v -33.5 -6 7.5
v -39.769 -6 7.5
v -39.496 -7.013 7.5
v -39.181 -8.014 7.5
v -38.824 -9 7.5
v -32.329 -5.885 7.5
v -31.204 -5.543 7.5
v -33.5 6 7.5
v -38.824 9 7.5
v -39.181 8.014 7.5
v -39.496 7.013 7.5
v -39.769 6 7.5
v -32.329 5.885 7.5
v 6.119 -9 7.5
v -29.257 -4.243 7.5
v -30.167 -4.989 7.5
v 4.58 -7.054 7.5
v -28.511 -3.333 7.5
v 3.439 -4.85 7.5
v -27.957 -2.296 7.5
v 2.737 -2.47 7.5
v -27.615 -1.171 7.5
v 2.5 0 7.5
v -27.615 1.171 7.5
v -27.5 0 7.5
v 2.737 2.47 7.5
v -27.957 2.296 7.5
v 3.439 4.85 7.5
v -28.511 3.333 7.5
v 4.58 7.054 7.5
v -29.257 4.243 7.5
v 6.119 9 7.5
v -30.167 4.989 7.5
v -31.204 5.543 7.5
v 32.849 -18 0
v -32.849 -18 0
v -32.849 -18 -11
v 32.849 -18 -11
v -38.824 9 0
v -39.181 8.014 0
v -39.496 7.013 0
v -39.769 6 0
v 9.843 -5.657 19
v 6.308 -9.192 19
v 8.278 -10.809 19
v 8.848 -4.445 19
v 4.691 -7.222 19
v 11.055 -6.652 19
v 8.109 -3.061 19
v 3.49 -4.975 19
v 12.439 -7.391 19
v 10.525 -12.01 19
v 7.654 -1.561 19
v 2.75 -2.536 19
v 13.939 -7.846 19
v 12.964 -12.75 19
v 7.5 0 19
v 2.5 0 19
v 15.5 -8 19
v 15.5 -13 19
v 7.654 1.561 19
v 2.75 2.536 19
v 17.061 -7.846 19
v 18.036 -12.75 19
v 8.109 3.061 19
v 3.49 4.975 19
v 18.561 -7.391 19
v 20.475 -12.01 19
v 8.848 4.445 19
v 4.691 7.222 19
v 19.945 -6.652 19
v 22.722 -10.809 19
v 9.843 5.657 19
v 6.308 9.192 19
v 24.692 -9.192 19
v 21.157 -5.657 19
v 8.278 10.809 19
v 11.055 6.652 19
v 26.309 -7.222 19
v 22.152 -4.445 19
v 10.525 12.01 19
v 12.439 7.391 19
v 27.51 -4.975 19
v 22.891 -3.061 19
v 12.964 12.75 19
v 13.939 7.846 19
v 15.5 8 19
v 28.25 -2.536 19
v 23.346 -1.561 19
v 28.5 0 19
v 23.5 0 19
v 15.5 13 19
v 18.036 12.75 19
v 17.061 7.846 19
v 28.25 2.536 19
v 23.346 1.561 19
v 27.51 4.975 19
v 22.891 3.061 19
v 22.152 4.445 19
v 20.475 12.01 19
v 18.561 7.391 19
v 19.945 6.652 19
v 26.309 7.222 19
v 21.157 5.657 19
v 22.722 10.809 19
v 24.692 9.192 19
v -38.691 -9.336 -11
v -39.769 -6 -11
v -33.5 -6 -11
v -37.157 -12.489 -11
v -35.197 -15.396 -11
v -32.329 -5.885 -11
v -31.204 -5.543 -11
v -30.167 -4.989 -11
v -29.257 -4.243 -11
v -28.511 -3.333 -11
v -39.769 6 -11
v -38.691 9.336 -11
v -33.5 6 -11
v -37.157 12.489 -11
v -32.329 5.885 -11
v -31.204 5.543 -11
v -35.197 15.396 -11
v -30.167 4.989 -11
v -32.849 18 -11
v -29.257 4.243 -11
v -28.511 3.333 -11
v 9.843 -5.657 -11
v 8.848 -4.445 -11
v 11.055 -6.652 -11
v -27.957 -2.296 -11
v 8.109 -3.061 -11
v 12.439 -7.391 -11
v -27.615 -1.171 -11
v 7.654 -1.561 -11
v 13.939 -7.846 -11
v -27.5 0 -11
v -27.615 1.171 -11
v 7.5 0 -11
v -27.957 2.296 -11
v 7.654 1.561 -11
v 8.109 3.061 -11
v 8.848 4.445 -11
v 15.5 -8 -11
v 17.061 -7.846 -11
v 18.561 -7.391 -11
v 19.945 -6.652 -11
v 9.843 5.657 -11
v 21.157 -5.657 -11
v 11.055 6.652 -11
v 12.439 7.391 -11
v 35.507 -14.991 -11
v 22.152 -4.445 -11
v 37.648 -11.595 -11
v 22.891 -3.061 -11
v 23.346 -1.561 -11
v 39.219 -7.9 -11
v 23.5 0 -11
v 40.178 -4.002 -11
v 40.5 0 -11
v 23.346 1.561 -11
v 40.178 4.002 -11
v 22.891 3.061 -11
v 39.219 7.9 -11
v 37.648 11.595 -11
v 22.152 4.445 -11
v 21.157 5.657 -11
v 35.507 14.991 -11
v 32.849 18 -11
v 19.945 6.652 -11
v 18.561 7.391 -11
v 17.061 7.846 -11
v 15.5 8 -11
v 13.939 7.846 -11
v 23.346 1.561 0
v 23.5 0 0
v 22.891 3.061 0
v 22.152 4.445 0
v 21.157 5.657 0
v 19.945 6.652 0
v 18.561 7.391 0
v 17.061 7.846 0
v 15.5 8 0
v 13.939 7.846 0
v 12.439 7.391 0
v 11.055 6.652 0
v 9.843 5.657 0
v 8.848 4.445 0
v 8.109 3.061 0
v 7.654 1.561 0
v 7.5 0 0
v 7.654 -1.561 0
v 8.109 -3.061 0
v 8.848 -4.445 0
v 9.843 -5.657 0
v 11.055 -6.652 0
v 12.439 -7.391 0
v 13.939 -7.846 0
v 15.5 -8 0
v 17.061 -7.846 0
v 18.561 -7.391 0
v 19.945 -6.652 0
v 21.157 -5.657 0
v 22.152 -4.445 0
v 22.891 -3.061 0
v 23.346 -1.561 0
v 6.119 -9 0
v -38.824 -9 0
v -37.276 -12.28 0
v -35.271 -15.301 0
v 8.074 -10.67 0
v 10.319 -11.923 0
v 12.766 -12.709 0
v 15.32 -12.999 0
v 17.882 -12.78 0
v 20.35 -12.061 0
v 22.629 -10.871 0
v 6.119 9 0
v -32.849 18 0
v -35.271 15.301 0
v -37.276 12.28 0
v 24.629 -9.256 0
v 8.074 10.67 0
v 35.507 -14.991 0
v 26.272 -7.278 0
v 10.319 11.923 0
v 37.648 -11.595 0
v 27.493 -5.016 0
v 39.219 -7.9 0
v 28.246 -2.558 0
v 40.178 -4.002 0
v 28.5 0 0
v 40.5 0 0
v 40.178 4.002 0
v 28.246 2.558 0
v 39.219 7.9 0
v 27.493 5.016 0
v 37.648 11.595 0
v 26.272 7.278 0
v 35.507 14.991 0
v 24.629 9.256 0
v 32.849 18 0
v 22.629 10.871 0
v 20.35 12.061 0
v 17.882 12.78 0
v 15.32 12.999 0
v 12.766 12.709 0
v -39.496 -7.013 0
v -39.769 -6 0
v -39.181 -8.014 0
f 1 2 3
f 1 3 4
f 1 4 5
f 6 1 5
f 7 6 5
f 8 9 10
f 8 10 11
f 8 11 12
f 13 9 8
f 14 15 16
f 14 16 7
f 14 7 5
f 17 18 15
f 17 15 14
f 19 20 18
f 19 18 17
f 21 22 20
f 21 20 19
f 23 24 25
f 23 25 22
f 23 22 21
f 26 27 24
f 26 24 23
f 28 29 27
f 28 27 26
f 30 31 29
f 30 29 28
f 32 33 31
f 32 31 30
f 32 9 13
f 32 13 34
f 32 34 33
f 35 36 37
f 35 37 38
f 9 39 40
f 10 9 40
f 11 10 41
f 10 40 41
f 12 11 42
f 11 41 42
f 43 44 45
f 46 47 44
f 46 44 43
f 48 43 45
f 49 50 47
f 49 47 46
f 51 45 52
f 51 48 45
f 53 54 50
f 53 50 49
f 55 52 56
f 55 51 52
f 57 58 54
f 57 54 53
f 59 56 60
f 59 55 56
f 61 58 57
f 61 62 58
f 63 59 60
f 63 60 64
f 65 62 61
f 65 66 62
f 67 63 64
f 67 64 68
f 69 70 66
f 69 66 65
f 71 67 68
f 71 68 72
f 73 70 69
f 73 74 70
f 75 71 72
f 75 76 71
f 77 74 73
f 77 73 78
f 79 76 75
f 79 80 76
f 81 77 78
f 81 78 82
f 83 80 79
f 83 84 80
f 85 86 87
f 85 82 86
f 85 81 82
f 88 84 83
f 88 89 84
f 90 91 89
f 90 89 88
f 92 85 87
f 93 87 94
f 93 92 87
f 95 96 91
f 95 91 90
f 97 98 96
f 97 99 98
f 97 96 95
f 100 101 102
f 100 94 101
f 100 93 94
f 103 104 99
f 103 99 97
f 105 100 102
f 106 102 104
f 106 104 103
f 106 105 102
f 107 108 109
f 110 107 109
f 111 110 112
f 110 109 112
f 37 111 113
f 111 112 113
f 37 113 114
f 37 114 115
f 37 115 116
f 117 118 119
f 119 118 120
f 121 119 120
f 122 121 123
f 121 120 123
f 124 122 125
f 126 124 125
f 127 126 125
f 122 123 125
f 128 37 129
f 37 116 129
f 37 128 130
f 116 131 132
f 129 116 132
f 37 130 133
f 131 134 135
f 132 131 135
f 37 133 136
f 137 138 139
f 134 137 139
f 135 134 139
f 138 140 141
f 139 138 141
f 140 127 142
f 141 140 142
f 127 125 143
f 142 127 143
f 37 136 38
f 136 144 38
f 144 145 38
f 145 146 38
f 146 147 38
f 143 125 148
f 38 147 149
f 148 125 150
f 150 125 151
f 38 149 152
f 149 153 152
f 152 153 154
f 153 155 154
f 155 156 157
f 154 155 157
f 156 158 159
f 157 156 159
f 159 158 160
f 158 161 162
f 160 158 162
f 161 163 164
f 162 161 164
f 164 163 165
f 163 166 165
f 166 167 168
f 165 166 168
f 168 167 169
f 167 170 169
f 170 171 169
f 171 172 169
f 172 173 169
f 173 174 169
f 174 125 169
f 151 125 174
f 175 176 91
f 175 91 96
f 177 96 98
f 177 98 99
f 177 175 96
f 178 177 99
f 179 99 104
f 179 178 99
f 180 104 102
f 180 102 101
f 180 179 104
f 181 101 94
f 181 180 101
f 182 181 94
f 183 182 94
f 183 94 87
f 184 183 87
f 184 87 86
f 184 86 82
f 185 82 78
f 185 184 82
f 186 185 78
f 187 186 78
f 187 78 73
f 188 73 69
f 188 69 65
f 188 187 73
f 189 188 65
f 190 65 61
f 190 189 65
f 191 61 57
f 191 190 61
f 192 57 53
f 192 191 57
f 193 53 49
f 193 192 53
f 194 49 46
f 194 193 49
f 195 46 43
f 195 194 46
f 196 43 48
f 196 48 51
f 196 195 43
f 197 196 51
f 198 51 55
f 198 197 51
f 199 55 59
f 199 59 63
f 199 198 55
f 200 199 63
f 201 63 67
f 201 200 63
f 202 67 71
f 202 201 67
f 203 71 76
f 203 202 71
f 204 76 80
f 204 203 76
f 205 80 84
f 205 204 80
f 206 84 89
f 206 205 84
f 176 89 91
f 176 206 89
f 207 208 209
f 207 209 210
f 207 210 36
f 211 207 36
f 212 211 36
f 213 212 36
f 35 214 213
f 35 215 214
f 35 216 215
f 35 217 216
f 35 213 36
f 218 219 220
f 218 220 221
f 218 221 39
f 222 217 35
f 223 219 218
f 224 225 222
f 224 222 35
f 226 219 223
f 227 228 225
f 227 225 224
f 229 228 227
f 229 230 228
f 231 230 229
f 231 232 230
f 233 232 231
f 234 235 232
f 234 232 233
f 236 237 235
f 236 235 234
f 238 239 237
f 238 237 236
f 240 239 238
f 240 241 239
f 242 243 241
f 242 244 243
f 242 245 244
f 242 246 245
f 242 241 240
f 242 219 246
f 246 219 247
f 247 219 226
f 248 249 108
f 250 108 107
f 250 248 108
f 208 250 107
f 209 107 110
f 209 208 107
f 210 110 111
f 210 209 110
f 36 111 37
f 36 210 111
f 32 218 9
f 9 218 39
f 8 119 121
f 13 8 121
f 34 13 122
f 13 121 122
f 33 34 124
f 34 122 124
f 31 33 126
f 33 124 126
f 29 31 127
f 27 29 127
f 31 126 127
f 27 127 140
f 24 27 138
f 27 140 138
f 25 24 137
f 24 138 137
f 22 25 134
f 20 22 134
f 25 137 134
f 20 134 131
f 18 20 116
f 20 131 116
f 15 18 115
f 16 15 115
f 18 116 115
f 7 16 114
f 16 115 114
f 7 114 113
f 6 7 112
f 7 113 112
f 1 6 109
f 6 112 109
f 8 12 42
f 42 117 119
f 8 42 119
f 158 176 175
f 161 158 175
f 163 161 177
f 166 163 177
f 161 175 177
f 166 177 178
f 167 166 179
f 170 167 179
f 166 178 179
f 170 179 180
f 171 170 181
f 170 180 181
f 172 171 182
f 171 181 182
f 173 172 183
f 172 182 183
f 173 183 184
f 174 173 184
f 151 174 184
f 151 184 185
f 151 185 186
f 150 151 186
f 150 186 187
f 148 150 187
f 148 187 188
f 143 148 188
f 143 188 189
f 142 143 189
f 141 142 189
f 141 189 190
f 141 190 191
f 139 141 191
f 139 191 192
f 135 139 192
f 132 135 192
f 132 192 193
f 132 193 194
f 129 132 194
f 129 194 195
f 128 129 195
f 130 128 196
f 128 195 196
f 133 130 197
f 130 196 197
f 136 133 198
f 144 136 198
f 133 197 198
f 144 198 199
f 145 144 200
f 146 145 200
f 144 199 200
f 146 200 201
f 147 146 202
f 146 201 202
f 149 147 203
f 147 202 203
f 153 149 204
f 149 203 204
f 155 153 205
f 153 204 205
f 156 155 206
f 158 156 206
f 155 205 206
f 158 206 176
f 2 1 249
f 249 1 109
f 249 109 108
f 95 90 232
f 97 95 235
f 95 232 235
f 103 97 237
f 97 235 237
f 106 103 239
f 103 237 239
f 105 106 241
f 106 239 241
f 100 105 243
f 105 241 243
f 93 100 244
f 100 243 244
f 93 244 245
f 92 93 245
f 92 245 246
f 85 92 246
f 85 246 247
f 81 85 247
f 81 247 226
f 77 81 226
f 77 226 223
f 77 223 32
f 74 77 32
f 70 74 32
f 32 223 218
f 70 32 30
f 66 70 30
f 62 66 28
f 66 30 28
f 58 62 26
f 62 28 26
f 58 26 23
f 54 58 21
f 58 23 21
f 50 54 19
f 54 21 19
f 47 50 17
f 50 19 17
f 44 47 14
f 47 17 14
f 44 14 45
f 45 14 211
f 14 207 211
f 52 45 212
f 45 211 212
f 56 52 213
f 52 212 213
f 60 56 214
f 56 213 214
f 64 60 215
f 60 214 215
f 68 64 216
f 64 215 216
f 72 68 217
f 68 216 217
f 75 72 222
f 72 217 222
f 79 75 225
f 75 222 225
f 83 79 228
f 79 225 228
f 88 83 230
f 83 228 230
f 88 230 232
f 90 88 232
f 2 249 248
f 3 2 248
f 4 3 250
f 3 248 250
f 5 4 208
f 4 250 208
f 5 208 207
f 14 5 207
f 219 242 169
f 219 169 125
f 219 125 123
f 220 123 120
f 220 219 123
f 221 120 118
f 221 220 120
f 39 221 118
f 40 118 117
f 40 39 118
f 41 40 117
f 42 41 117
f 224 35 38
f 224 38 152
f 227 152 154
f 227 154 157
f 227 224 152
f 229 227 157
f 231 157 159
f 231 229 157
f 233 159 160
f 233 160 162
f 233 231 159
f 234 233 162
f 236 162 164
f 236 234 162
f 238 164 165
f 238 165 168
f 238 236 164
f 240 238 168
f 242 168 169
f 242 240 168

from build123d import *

# Parameters (mm, degrees)
BOSS_EXTRUDE1_DEPTH = 11
BOSS_EXTRUDE2_DEPTH = 7.5
SKETCH2_3_R         = 13
SKETCH2_3_R_2       = 8
BOSS_EXTRUDE3_DEPTH = 19
SKETCH8_R           = 8
CUT_EXTRUDE1_DEPTH  = 19


with BuildPart() as part:
    # Sketch1 → Boss-Extrude1 (new body)
    with BuildSketch(Plane.XY):
        with BuildLine():
            Line((-32.849351573, -18), (32.849351573, -18))
            ThreePointArc((32.849351573, -18), (40.5, 0), (32.849351573, 18))
            Line((32.849351573, 18), (-32.849351573, 18))
            ThreePointArc((-32.849351573, 18), (-37.157065859, 12.488854966), (-39.769322199, 6))
            Line((-39.769322199, 6), (-33.5, 6))
            ThreePointArc((-33.5, 6), (-27.5, 0), (-33.5, -6))
            Line((-33.5, -6), (-39.769322199, -6))
            ThreePointArc((-39.769322199, -6), (-37.157065859, -12.488854966), (-32.849351573, -18))
        make_face()
    extrude(amount=-BOSS_EXTRUDE1_DEPTH)

    # Sketch2 → Boss-Extrude2 (add)
    with BuildSketch(Plane.XY):
        with BuildLine():
            ThreePointArc((-39.769322199, -6), (-39.343793753, -7.514885194), (-38.823807579, -9))
            Line((-38.823807579, -9), (6.11916848, -9))
            ThreePointArc((6.11916848, -9), (2.5, 0), (6.11916848, 9))
            Line((6.11916848, 9), (-38.823807579, 9))
            ThreePointArc((-38.823807579, 9), (-39.343793753, 7.514885194), (-39.769322199, 6))
            Line((-39.769322199, 6), (-33.5, 6))
            ThreePointArc((-33.5, 6), (-27.5, 0), (-33.5, -6))
            Line((-33.5, -6), (-39.769322199, -6))
        make_face()
    extrude(amount=BOSS_EXTRUDE2_DEPTH)

    # Sketch2<3> → Boss-Extrude3 (add)
    with BuildSketch(Plane.XY):
        with Locations((15.5, 0)):
            Circle(SKETCH2_3_R)
        with Locations((15.5, 0)):
            Circle(SKETCH2_3_R_2, mode=Mode.SUBTRACT)
    extrude(amount=BOSS_EXTRUDE3_DEPTH)

    # Sketch8 → Cut-Extrude1 (cut)
    with BuildSketch(Plane.XY):
        with Locations((15.5, 0)):
            Circle(SKETCH8_R)
    extrude(amount=-CUT_EXTRUDE1_DEPTH, mode=Mode.SUBTRACT)


solid = part.part
